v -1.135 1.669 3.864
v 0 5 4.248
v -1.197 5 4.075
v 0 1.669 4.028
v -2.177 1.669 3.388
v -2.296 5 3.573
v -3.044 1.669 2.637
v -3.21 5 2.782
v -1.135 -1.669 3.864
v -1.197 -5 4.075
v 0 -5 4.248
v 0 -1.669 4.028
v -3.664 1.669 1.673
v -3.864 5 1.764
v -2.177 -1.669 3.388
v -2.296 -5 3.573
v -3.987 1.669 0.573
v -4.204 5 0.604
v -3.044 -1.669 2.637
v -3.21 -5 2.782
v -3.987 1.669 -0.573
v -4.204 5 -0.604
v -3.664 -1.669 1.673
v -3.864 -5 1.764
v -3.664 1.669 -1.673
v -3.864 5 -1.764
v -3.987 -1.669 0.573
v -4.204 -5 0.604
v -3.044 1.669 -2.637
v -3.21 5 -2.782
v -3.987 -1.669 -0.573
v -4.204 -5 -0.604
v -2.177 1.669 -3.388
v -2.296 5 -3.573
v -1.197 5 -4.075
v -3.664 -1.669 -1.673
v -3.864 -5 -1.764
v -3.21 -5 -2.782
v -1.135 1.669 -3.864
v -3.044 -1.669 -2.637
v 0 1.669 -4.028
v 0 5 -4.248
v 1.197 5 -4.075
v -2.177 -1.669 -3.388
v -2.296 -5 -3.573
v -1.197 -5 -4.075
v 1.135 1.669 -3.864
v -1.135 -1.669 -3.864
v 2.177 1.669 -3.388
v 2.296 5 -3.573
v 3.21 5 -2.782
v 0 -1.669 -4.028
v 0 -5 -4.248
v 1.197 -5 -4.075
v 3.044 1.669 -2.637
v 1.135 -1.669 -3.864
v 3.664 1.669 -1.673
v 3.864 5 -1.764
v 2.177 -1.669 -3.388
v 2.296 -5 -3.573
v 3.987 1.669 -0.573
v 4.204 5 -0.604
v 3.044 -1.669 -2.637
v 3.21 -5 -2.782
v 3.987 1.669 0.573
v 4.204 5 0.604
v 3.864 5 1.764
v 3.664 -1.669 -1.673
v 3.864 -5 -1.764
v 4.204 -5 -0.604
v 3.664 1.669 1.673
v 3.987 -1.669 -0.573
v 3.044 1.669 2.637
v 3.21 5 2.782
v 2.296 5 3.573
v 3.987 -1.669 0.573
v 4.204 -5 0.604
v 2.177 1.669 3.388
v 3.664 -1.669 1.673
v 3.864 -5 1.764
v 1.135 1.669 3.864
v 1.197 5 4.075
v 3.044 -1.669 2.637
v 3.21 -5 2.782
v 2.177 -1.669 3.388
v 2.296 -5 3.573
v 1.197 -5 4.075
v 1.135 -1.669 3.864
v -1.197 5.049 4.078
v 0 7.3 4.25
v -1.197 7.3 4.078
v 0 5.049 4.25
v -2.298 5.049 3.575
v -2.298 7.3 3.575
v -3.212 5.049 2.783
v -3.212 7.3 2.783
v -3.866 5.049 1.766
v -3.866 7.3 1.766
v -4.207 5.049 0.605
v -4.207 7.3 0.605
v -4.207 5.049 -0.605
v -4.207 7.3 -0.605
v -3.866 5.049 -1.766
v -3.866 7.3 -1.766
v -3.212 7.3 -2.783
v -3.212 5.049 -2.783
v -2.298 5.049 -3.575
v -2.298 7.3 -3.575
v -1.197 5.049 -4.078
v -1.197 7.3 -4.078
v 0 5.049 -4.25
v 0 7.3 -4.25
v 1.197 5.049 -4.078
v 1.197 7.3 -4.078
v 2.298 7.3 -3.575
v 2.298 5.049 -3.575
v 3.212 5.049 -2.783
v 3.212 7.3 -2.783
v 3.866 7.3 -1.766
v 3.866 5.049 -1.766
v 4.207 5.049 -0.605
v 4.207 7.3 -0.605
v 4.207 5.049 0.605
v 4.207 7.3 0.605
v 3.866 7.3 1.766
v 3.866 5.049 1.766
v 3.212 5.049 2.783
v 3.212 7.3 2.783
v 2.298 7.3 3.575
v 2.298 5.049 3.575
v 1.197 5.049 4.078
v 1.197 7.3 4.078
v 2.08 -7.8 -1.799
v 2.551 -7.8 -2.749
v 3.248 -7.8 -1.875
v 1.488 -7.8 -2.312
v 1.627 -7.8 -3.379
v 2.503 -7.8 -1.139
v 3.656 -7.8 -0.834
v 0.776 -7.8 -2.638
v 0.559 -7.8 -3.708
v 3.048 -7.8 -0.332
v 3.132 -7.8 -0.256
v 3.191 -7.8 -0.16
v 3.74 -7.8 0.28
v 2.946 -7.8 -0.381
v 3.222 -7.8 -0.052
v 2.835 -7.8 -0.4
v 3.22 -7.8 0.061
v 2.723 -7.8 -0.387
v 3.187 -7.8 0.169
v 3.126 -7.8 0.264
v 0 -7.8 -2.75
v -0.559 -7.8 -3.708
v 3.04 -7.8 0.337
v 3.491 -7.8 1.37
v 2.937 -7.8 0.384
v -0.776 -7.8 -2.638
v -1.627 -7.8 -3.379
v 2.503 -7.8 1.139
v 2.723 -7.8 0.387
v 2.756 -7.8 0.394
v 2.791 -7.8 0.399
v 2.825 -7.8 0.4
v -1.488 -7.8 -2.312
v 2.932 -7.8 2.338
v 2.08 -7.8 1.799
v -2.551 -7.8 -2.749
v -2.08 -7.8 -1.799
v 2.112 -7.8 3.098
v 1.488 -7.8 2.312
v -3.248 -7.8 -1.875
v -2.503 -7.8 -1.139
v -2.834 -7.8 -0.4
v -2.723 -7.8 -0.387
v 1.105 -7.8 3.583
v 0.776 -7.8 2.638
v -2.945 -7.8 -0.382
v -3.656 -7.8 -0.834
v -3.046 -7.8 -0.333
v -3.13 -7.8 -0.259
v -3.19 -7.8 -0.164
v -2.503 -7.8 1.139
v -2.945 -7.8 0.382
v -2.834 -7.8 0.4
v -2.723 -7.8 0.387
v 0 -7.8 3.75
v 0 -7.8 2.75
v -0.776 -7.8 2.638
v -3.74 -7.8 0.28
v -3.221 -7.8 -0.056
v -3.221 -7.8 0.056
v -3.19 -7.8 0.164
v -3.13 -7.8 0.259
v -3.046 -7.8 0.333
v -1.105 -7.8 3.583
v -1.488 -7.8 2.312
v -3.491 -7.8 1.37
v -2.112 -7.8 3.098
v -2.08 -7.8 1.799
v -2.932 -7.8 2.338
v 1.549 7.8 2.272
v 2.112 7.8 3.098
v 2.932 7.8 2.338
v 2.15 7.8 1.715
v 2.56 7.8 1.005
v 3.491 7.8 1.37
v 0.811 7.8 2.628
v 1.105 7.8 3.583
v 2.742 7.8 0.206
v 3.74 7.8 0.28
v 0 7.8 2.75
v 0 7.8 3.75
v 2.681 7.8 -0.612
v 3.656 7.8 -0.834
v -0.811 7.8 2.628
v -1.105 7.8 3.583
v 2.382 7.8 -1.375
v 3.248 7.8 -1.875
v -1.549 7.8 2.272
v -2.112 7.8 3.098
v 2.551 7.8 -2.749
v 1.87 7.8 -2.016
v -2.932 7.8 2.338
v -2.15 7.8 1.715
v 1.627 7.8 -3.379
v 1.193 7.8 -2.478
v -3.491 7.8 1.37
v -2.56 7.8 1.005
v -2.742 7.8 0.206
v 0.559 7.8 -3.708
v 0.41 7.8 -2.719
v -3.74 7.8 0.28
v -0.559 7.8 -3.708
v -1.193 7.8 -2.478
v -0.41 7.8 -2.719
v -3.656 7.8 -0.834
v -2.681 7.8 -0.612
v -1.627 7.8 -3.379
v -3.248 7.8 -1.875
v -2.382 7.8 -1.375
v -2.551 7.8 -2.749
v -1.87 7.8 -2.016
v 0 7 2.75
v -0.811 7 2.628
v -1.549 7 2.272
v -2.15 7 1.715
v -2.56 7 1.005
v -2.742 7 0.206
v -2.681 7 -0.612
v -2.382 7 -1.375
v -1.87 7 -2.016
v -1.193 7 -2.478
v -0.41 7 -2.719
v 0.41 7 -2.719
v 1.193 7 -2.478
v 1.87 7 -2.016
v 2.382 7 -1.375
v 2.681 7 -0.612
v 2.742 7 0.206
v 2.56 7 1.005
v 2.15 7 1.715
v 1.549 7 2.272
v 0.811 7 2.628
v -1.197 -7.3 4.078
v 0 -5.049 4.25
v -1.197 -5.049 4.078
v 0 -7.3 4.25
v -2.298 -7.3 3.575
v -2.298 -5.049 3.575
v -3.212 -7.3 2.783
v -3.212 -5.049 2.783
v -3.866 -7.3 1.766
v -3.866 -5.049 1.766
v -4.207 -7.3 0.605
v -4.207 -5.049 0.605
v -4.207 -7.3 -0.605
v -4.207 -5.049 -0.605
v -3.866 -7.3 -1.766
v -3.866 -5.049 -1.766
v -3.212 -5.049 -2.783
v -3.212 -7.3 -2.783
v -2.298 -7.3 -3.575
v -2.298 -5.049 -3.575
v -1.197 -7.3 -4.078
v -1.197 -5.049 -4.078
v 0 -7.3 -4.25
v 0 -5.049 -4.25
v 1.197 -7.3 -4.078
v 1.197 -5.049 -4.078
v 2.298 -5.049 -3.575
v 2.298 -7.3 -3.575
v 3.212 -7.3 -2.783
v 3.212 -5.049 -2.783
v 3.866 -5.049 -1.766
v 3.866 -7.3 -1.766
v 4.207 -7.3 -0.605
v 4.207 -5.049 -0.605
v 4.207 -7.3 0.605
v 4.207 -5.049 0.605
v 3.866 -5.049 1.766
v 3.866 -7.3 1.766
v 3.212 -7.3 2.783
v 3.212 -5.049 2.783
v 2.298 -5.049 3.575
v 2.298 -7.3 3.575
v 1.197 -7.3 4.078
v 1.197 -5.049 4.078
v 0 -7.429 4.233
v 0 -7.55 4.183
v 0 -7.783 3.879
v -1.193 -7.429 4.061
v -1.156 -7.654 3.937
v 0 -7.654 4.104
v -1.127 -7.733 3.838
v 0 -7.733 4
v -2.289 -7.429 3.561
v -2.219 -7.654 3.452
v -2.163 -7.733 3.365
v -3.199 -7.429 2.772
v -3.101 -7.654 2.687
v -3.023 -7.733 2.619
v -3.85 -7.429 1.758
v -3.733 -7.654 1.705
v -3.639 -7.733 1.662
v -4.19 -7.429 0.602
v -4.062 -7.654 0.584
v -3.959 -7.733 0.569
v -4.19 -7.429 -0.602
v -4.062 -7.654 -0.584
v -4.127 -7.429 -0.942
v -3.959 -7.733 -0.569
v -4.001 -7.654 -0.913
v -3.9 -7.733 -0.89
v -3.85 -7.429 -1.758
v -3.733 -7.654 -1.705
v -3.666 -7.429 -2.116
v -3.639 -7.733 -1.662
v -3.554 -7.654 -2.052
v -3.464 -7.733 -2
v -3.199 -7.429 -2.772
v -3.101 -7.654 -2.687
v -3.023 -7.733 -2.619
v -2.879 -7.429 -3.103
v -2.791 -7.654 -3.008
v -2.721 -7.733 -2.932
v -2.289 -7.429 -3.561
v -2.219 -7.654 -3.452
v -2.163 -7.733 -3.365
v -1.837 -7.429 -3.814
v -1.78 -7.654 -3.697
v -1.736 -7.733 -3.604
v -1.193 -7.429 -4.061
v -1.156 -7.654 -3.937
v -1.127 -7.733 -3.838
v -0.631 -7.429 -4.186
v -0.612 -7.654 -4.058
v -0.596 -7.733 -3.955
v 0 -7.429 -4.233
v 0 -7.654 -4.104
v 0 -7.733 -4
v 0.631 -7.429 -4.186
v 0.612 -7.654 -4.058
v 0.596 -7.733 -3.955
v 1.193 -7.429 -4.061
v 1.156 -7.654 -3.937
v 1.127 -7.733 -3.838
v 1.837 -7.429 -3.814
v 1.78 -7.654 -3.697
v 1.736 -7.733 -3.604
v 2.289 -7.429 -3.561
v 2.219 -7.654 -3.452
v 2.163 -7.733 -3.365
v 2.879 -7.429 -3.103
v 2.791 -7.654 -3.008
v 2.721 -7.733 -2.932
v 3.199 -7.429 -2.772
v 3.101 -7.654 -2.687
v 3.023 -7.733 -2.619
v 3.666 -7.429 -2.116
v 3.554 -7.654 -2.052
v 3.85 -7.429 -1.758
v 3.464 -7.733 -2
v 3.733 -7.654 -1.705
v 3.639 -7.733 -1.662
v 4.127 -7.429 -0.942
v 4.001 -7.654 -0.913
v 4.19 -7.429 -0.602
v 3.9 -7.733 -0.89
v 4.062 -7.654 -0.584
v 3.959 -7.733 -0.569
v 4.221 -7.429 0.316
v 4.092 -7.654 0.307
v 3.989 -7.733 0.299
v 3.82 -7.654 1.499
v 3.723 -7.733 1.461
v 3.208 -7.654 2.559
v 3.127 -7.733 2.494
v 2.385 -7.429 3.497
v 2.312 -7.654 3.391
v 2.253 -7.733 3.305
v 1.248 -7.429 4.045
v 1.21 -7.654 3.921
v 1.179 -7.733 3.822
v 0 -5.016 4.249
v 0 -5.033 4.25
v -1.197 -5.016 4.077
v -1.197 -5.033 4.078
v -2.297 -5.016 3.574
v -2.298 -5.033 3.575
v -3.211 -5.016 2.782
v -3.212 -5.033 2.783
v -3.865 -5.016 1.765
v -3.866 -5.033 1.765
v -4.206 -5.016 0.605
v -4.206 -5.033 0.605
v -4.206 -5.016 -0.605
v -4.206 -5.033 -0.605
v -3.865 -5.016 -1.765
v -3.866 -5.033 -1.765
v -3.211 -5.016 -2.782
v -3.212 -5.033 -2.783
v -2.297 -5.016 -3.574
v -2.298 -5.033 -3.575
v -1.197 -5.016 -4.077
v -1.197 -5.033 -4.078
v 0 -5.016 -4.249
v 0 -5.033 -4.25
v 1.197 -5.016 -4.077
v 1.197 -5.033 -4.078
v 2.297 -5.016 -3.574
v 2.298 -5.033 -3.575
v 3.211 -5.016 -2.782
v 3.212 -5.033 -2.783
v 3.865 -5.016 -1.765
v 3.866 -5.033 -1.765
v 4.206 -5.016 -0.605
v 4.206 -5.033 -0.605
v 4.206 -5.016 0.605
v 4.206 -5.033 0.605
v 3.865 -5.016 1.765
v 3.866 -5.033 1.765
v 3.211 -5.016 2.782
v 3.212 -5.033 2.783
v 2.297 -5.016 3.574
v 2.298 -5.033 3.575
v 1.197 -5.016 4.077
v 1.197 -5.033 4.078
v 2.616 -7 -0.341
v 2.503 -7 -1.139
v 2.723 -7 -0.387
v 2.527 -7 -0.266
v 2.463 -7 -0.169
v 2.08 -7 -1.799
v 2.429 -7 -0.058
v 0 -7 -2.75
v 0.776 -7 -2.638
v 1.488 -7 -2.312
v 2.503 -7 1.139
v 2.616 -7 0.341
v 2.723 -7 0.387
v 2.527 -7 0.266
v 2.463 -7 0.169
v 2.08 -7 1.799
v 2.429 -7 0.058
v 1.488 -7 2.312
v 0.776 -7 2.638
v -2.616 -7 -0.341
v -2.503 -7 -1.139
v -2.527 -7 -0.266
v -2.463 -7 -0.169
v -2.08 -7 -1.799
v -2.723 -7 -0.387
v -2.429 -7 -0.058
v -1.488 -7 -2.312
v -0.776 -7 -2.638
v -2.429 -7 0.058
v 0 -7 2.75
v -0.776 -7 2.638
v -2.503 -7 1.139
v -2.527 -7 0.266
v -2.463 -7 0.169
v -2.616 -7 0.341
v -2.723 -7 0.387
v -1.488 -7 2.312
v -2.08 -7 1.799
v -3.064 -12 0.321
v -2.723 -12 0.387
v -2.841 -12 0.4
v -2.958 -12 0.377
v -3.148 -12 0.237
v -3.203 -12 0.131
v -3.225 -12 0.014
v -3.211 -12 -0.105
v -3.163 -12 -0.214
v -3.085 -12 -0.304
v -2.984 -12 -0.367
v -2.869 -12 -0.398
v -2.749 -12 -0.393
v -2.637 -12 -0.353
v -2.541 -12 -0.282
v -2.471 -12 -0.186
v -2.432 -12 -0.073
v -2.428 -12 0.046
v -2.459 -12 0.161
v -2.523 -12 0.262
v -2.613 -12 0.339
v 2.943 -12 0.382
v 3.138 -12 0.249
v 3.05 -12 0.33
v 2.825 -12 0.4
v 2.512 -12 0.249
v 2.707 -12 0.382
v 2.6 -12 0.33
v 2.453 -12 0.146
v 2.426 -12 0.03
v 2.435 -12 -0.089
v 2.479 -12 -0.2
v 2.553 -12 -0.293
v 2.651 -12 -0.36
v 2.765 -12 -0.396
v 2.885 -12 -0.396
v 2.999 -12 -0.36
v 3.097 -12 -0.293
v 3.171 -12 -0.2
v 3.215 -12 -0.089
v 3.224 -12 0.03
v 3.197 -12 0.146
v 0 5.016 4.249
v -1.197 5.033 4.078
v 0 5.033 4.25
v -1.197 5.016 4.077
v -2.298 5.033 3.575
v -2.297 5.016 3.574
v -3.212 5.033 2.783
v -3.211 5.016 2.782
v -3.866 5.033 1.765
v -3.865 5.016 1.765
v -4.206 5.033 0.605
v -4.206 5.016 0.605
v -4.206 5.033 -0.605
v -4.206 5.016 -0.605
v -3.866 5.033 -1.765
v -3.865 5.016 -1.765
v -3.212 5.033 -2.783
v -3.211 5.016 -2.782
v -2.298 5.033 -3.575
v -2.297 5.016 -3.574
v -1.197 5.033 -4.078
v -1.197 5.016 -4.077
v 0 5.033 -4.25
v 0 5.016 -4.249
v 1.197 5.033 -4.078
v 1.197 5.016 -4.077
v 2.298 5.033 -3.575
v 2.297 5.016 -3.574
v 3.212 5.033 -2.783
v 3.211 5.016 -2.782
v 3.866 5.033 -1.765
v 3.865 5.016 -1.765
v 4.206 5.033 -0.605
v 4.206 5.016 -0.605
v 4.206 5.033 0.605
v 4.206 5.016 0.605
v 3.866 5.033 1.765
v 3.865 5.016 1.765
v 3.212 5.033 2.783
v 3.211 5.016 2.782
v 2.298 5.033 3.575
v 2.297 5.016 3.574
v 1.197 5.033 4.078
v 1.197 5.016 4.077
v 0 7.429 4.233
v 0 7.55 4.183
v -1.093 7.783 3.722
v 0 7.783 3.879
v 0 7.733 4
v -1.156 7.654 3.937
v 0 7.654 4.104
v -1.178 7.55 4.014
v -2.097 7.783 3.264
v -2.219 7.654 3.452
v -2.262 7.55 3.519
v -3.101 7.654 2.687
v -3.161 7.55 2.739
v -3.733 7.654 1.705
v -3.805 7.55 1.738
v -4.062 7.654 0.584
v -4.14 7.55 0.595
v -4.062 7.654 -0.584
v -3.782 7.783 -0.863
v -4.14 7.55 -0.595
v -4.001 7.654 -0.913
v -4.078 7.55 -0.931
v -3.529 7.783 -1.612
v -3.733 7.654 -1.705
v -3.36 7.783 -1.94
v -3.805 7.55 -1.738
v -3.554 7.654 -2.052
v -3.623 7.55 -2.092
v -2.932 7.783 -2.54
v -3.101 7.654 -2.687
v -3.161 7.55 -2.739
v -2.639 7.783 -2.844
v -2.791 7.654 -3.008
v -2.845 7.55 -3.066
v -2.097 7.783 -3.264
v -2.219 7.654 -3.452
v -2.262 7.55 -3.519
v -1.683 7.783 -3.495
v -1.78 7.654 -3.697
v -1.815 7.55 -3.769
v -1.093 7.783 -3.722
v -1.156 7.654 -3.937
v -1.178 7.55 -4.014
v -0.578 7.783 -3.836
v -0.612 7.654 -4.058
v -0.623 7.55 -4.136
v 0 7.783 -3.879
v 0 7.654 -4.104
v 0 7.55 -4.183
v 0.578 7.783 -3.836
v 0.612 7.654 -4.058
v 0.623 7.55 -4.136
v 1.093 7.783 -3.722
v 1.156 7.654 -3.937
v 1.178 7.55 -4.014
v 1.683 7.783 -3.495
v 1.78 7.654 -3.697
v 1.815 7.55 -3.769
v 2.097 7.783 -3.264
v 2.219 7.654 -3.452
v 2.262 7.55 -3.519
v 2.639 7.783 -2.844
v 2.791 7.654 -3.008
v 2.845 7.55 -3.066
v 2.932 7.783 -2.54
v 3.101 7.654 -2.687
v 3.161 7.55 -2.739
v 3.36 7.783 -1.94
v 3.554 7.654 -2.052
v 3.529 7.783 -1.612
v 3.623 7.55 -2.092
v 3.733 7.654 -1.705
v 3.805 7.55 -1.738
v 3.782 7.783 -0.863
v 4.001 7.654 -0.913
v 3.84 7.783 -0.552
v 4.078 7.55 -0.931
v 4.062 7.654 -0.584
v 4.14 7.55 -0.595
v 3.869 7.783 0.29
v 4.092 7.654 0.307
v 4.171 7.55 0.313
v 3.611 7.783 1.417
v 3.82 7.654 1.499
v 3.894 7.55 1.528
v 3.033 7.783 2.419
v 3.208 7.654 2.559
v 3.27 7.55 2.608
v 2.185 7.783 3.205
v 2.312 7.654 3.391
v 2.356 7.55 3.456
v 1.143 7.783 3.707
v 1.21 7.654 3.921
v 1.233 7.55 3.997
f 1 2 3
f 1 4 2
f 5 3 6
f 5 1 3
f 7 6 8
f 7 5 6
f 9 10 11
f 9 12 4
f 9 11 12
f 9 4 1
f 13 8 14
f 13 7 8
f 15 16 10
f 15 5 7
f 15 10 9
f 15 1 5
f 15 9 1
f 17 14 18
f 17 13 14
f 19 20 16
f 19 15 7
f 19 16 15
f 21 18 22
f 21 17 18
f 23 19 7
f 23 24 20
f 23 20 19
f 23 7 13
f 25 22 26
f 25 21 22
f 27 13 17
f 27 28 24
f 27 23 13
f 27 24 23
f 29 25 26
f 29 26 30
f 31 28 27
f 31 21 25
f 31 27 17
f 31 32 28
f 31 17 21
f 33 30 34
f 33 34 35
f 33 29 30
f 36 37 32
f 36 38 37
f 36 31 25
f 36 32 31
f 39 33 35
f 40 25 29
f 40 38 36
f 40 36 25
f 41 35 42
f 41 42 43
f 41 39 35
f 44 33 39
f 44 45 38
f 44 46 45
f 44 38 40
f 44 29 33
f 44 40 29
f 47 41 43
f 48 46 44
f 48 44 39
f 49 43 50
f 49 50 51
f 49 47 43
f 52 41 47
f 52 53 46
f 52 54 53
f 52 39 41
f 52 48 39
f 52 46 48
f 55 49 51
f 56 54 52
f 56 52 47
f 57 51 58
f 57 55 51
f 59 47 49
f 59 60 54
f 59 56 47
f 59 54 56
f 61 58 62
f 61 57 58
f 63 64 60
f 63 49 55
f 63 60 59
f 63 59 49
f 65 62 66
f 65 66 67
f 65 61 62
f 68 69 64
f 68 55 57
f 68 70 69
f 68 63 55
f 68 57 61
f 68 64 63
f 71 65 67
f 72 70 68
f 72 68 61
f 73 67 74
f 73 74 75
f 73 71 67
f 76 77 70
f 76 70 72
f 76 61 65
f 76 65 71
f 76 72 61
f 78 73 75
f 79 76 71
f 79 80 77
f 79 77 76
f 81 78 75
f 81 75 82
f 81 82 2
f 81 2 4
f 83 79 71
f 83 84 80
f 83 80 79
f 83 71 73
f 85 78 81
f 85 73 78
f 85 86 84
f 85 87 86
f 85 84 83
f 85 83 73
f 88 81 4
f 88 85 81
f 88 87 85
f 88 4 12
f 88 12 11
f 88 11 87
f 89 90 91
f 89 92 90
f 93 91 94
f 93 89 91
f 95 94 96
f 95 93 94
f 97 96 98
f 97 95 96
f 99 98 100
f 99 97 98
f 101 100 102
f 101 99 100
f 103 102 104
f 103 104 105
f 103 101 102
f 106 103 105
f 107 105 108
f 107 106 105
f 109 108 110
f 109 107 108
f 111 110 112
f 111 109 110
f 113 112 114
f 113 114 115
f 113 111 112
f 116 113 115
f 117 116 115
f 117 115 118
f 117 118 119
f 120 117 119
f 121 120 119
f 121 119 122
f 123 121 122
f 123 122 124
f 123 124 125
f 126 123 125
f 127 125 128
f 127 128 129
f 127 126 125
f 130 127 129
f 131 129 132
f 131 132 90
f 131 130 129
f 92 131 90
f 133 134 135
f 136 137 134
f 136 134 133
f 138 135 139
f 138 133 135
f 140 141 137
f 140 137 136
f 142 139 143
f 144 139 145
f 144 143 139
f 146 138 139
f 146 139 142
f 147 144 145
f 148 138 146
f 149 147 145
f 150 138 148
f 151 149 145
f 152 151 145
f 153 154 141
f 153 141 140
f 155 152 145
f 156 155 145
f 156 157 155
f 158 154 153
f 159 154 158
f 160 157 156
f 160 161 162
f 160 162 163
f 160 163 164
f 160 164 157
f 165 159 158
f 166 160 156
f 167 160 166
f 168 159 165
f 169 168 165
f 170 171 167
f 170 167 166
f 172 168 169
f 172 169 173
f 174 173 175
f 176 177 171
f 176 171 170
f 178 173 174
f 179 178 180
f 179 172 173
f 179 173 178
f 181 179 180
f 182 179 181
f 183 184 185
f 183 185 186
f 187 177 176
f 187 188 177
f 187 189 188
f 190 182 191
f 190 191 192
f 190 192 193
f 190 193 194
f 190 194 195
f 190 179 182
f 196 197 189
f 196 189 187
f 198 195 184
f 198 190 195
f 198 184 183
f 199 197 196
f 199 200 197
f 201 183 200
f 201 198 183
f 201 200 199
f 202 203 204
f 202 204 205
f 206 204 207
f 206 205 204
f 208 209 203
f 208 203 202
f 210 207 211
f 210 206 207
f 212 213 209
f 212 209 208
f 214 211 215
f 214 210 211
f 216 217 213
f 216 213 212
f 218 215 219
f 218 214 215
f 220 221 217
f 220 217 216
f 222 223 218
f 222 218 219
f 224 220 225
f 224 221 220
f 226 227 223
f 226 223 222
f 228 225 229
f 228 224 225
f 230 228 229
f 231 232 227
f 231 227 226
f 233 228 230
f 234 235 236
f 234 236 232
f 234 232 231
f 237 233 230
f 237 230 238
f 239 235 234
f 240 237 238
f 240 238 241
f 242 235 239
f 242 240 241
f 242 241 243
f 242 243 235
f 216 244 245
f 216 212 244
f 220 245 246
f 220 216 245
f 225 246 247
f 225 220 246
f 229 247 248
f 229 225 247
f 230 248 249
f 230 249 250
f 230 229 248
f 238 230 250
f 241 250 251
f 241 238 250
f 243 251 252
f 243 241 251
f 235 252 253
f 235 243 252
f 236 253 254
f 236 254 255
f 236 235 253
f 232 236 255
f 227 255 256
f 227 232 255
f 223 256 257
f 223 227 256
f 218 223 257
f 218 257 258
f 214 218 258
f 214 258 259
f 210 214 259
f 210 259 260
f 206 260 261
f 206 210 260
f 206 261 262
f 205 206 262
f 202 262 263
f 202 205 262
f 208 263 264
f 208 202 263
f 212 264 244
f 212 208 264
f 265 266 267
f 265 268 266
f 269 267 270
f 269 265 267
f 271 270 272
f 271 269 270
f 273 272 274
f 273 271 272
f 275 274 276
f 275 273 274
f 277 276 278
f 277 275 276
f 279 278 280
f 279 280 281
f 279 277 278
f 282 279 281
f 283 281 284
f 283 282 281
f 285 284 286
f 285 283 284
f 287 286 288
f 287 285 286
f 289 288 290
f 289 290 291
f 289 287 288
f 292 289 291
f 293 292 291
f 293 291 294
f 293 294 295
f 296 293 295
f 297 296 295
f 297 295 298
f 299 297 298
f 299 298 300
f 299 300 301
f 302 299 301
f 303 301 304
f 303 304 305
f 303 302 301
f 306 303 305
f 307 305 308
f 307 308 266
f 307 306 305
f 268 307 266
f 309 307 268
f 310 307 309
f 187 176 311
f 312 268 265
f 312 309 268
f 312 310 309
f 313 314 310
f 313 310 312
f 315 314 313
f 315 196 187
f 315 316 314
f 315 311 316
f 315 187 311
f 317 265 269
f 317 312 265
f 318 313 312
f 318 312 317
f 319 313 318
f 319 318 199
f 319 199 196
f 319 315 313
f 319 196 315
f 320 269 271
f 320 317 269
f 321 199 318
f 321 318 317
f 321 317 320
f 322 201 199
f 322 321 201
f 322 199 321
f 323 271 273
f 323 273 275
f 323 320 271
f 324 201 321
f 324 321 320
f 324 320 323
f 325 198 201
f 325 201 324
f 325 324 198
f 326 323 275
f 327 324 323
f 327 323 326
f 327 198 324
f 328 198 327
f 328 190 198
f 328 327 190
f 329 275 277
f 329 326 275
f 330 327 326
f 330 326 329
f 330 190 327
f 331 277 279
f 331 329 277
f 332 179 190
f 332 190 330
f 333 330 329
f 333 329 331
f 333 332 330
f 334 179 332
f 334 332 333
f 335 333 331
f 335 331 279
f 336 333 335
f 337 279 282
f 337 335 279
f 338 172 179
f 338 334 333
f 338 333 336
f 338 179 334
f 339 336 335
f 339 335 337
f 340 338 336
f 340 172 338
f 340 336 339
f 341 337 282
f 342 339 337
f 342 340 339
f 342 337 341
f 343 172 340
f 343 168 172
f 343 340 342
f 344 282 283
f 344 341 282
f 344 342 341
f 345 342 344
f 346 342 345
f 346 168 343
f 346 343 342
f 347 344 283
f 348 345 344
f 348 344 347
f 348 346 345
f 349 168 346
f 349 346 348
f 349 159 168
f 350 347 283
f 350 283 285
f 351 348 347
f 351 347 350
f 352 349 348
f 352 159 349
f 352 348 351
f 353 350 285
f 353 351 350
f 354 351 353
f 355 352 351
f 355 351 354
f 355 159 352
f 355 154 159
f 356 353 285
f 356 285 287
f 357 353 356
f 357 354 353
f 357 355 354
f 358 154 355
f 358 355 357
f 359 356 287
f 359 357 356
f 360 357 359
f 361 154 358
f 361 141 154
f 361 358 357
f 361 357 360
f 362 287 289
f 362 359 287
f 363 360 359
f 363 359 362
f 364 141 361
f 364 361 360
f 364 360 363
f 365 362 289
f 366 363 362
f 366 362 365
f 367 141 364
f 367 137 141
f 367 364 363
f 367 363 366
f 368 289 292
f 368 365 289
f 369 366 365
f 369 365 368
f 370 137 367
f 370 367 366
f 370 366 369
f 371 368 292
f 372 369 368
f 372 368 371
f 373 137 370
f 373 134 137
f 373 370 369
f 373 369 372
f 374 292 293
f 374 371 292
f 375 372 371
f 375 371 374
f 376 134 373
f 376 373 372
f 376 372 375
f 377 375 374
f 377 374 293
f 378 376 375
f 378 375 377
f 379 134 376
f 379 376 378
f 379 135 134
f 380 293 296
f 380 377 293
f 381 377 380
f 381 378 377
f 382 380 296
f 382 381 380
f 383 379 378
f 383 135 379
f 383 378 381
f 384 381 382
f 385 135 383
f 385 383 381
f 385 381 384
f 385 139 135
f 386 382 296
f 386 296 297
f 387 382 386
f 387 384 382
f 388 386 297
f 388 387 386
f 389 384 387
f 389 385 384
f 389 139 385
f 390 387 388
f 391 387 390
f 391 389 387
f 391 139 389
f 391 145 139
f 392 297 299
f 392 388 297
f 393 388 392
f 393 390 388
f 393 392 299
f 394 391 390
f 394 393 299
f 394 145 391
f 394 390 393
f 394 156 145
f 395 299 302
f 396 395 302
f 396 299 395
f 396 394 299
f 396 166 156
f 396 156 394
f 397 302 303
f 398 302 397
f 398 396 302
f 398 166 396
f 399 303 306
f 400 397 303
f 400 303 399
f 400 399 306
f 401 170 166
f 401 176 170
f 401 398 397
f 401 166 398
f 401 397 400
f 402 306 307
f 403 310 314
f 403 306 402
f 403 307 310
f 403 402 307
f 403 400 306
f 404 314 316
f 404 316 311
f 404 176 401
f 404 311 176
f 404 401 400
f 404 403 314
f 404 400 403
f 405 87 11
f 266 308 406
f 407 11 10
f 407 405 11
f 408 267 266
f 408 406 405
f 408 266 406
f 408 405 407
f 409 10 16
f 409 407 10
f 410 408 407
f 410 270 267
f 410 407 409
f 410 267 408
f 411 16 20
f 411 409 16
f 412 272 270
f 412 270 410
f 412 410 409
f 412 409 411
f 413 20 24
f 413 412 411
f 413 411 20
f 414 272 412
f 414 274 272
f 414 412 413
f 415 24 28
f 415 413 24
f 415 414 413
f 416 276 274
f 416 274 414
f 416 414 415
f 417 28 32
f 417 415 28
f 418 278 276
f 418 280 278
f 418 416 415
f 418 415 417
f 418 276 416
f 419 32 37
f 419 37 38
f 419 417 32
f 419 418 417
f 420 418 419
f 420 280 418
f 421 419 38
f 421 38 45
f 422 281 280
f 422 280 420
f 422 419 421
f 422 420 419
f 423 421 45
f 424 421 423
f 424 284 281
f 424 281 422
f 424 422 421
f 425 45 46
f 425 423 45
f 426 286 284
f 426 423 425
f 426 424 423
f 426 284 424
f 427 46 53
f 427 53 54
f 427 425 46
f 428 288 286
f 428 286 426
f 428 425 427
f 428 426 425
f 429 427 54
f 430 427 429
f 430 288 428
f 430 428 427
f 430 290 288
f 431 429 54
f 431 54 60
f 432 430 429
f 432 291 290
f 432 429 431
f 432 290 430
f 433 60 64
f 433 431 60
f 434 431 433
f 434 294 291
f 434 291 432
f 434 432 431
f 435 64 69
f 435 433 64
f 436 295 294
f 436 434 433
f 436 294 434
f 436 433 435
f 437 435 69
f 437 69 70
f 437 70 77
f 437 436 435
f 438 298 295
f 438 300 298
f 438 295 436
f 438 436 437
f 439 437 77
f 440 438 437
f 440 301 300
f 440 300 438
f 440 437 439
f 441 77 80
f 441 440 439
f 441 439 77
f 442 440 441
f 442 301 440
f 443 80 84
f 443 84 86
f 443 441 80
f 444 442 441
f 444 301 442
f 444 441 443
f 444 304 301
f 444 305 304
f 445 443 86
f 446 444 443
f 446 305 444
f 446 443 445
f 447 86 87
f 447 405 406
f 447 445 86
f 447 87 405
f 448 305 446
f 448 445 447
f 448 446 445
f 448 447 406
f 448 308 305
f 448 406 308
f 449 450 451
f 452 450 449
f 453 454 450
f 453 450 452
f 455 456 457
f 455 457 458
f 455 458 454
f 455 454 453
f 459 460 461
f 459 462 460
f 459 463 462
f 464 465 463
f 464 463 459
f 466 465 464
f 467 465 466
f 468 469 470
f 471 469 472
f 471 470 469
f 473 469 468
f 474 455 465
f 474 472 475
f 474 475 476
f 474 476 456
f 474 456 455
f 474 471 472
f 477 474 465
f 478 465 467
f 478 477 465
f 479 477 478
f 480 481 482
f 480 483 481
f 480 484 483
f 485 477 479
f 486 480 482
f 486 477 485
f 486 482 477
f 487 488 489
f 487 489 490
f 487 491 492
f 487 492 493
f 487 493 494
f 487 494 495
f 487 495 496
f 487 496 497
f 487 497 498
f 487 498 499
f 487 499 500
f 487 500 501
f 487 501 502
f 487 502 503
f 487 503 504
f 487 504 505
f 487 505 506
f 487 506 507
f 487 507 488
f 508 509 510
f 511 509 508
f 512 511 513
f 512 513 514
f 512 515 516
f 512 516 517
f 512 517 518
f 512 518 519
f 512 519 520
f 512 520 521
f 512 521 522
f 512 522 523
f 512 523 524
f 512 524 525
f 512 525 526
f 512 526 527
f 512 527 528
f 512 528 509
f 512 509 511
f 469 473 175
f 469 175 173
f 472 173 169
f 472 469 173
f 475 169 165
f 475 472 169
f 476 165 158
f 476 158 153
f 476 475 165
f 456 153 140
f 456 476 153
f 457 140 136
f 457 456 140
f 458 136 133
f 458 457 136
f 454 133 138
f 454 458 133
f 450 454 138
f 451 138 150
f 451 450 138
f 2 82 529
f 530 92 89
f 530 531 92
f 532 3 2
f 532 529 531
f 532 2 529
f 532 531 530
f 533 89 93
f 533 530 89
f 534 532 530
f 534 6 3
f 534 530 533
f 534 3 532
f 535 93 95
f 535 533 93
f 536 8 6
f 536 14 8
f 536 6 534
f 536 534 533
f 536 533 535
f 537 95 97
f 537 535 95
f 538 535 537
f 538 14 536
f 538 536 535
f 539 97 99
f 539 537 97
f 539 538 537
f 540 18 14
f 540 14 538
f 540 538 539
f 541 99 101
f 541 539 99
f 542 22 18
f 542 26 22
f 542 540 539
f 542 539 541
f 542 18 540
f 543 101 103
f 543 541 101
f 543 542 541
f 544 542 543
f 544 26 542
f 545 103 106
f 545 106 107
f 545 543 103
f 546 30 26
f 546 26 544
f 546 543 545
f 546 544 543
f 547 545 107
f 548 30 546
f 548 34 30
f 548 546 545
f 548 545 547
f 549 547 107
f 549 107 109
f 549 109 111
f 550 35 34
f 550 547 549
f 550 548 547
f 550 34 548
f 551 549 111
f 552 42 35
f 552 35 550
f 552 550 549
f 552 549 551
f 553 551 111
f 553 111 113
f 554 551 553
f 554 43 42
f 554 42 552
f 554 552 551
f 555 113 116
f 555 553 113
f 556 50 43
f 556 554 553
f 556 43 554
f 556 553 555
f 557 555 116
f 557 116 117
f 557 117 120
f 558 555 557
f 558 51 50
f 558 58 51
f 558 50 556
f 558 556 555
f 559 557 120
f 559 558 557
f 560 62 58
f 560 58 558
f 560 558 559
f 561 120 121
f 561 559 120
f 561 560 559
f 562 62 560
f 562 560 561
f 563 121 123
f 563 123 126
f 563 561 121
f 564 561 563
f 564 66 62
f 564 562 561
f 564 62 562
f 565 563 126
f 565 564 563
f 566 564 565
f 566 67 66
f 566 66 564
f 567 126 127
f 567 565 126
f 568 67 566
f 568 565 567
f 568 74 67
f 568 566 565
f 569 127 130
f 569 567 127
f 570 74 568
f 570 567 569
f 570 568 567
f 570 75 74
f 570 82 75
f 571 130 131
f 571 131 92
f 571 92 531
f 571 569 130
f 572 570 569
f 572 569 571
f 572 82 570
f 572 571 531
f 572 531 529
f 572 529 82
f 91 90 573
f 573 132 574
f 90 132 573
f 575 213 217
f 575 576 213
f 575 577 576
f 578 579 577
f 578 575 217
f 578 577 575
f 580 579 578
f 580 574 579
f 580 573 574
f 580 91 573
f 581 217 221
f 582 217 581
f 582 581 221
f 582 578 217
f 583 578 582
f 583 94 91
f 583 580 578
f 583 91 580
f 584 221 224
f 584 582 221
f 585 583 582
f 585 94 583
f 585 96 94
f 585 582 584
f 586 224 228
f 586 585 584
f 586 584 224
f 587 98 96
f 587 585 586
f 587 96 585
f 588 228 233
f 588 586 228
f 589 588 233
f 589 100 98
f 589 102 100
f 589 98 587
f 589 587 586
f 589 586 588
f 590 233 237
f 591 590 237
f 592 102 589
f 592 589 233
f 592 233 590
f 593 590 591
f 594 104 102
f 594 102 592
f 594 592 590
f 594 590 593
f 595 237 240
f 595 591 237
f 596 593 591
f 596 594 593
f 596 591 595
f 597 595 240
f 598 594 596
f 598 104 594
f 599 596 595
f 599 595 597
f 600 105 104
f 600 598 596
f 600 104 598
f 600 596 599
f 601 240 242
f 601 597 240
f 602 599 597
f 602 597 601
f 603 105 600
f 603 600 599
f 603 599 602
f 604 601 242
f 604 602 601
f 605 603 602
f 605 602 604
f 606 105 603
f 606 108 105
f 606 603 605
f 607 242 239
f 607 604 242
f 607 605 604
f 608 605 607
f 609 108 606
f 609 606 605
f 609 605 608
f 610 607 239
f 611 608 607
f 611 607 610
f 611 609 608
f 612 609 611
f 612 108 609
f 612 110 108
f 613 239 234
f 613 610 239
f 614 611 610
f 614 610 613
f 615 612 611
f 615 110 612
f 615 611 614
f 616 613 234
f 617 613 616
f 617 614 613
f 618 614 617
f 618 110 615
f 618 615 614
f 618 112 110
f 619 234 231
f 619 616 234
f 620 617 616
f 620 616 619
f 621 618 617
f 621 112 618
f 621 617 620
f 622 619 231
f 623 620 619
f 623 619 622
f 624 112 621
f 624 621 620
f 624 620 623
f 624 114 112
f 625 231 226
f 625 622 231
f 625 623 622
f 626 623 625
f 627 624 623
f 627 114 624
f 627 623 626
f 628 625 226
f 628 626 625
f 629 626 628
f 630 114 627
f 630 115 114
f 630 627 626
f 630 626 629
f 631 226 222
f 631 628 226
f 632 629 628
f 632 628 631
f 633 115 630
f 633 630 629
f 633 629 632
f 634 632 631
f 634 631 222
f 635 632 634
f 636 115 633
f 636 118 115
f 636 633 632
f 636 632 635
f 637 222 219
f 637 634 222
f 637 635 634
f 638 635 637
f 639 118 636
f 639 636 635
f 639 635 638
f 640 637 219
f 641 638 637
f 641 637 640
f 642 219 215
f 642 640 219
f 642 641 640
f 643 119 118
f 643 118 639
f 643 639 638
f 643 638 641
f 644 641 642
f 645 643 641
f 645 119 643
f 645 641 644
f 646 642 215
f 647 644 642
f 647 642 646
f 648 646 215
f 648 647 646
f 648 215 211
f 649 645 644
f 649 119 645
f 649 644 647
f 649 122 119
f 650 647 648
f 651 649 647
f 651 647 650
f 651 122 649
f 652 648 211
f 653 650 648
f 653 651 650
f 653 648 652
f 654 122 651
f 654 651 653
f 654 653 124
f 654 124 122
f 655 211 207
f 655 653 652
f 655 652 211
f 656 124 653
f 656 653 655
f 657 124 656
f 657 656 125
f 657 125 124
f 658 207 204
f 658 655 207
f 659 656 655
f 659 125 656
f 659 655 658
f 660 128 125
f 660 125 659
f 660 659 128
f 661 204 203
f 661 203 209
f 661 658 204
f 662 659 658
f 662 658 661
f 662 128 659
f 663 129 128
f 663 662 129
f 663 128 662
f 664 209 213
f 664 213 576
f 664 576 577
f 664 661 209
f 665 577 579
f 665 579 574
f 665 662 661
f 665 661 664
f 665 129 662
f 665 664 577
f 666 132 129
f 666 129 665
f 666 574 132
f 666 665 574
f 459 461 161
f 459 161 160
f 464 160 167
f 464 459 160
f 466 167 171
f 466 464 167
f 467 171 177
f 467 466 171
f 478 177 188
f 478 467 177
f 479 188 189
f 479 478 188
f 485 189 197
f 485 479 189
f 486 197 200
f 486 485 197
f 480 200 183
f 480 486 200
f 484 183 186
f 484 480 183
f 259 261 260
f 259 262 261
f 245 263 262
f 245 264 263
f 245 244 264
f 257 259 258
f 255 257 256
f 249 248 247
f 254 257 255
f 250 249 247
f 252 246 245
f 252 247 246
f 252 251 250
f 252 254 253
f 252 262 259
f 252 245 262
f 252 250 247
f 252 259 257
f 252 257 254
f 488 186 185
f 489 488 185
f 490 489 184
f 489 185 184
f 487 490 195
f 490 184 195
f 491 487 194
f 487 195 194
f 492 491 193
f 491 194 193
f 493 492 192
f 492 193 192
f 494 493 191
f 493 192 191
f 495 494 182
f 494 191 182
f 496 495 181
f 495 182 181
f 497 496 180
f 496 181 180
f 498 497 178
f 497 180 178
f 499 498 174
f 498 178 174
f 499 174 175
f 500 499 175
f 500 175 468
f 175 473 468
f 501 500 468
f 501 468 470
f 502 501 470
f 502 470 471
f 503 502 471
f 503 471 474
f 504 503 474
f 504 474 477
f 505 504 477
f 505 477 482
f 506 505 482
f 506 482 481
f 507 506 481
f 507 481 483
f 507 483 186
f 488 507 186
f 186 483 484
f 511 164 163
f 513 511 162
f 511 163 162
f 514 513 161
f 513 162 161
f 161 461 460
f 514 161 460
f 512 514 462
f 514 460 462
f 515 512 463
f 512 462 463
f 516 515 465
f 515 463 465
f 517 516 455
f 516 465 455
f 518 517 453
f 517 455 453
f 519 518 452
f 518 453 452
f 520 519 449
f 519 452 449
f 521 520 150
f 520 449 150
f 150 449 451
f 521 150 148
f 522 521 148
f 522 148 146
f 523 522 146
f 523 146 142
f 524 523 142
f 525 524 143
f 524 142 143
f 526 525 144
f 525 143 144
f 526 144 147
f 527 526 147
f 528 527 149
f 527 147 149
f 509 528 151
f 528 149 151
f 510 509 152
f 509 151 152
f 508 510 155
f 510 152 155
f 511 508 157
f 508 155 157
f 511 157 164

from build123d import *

# Parameters (mm, degrees)
SKETCH3_R           = 0.4
BOSS_EXTRUDE1_DEPTH = 5


with BuildPart() as part:
    # Sketch1 → Revolve1 (revolve)
    with BuildSketch(Plane(origin=(0, 0, 0), x_dir=(0, 0, -1), z_dir=(1, 0, 0))):
        with BuildLine():
            Line((-4.25, 7.3), (-4.25, 5.049389861))
            ThreePointArc((-4.25, 5.049389861), (-4.249388291, 5.024664681), (-4.247554662, 5))
            ThreePointArc((-4.247554662, 5), (-4, 0), (-4.247554662, -5))
            ThreePointArc((-4.247554662, -5), (-4.249388291, -5.024664681), (-4.25, -5.049389861))
            Line((-4.25, -5.049389861), (-4.25, -7.3))
            ThreePointArc((-4.25, -7.3), (-4.103553391, -7.653553391), (-3.75, -7.8))
            Line((-3.75, -7.8), (-2.75, -7.8))
            Line((-2.75, -7.8), (-2.75, -7))
            Line((-2.75, -7), (0, -7))
            Line((0, -7), (0, 7))
            Line((0, 7), (-2.75, 7))
            Line((-2.75, 7), (-2.75, 7.8))
            Line((-2.75, 7.8), (-3.75, 7.8))
            ThreePointArc((-3.75, 7.8), (-4.103553391, 7.653553391), (-4.25, 7.3))
        make_face()
    revolve(axis=Axis((0, 12.565257793, 0), (0, -1, 0)))

    # Sketch3 → Boss-Extrude1 (add)
    with BuildSketch(Plane.XZ.offset(7)):
        with Locations(Location((-2.825, 0, 0), (0, 0, 75.178560111))):
            Circle(SKETCH3_R)
        with Locations(Location((2.825, 0, 0), (0, 0, 90))):
            Circle(SKETCH3_R)
    extrude(amount=BOSS_EXTRUDE1_DEPTH)


solid = part.part
